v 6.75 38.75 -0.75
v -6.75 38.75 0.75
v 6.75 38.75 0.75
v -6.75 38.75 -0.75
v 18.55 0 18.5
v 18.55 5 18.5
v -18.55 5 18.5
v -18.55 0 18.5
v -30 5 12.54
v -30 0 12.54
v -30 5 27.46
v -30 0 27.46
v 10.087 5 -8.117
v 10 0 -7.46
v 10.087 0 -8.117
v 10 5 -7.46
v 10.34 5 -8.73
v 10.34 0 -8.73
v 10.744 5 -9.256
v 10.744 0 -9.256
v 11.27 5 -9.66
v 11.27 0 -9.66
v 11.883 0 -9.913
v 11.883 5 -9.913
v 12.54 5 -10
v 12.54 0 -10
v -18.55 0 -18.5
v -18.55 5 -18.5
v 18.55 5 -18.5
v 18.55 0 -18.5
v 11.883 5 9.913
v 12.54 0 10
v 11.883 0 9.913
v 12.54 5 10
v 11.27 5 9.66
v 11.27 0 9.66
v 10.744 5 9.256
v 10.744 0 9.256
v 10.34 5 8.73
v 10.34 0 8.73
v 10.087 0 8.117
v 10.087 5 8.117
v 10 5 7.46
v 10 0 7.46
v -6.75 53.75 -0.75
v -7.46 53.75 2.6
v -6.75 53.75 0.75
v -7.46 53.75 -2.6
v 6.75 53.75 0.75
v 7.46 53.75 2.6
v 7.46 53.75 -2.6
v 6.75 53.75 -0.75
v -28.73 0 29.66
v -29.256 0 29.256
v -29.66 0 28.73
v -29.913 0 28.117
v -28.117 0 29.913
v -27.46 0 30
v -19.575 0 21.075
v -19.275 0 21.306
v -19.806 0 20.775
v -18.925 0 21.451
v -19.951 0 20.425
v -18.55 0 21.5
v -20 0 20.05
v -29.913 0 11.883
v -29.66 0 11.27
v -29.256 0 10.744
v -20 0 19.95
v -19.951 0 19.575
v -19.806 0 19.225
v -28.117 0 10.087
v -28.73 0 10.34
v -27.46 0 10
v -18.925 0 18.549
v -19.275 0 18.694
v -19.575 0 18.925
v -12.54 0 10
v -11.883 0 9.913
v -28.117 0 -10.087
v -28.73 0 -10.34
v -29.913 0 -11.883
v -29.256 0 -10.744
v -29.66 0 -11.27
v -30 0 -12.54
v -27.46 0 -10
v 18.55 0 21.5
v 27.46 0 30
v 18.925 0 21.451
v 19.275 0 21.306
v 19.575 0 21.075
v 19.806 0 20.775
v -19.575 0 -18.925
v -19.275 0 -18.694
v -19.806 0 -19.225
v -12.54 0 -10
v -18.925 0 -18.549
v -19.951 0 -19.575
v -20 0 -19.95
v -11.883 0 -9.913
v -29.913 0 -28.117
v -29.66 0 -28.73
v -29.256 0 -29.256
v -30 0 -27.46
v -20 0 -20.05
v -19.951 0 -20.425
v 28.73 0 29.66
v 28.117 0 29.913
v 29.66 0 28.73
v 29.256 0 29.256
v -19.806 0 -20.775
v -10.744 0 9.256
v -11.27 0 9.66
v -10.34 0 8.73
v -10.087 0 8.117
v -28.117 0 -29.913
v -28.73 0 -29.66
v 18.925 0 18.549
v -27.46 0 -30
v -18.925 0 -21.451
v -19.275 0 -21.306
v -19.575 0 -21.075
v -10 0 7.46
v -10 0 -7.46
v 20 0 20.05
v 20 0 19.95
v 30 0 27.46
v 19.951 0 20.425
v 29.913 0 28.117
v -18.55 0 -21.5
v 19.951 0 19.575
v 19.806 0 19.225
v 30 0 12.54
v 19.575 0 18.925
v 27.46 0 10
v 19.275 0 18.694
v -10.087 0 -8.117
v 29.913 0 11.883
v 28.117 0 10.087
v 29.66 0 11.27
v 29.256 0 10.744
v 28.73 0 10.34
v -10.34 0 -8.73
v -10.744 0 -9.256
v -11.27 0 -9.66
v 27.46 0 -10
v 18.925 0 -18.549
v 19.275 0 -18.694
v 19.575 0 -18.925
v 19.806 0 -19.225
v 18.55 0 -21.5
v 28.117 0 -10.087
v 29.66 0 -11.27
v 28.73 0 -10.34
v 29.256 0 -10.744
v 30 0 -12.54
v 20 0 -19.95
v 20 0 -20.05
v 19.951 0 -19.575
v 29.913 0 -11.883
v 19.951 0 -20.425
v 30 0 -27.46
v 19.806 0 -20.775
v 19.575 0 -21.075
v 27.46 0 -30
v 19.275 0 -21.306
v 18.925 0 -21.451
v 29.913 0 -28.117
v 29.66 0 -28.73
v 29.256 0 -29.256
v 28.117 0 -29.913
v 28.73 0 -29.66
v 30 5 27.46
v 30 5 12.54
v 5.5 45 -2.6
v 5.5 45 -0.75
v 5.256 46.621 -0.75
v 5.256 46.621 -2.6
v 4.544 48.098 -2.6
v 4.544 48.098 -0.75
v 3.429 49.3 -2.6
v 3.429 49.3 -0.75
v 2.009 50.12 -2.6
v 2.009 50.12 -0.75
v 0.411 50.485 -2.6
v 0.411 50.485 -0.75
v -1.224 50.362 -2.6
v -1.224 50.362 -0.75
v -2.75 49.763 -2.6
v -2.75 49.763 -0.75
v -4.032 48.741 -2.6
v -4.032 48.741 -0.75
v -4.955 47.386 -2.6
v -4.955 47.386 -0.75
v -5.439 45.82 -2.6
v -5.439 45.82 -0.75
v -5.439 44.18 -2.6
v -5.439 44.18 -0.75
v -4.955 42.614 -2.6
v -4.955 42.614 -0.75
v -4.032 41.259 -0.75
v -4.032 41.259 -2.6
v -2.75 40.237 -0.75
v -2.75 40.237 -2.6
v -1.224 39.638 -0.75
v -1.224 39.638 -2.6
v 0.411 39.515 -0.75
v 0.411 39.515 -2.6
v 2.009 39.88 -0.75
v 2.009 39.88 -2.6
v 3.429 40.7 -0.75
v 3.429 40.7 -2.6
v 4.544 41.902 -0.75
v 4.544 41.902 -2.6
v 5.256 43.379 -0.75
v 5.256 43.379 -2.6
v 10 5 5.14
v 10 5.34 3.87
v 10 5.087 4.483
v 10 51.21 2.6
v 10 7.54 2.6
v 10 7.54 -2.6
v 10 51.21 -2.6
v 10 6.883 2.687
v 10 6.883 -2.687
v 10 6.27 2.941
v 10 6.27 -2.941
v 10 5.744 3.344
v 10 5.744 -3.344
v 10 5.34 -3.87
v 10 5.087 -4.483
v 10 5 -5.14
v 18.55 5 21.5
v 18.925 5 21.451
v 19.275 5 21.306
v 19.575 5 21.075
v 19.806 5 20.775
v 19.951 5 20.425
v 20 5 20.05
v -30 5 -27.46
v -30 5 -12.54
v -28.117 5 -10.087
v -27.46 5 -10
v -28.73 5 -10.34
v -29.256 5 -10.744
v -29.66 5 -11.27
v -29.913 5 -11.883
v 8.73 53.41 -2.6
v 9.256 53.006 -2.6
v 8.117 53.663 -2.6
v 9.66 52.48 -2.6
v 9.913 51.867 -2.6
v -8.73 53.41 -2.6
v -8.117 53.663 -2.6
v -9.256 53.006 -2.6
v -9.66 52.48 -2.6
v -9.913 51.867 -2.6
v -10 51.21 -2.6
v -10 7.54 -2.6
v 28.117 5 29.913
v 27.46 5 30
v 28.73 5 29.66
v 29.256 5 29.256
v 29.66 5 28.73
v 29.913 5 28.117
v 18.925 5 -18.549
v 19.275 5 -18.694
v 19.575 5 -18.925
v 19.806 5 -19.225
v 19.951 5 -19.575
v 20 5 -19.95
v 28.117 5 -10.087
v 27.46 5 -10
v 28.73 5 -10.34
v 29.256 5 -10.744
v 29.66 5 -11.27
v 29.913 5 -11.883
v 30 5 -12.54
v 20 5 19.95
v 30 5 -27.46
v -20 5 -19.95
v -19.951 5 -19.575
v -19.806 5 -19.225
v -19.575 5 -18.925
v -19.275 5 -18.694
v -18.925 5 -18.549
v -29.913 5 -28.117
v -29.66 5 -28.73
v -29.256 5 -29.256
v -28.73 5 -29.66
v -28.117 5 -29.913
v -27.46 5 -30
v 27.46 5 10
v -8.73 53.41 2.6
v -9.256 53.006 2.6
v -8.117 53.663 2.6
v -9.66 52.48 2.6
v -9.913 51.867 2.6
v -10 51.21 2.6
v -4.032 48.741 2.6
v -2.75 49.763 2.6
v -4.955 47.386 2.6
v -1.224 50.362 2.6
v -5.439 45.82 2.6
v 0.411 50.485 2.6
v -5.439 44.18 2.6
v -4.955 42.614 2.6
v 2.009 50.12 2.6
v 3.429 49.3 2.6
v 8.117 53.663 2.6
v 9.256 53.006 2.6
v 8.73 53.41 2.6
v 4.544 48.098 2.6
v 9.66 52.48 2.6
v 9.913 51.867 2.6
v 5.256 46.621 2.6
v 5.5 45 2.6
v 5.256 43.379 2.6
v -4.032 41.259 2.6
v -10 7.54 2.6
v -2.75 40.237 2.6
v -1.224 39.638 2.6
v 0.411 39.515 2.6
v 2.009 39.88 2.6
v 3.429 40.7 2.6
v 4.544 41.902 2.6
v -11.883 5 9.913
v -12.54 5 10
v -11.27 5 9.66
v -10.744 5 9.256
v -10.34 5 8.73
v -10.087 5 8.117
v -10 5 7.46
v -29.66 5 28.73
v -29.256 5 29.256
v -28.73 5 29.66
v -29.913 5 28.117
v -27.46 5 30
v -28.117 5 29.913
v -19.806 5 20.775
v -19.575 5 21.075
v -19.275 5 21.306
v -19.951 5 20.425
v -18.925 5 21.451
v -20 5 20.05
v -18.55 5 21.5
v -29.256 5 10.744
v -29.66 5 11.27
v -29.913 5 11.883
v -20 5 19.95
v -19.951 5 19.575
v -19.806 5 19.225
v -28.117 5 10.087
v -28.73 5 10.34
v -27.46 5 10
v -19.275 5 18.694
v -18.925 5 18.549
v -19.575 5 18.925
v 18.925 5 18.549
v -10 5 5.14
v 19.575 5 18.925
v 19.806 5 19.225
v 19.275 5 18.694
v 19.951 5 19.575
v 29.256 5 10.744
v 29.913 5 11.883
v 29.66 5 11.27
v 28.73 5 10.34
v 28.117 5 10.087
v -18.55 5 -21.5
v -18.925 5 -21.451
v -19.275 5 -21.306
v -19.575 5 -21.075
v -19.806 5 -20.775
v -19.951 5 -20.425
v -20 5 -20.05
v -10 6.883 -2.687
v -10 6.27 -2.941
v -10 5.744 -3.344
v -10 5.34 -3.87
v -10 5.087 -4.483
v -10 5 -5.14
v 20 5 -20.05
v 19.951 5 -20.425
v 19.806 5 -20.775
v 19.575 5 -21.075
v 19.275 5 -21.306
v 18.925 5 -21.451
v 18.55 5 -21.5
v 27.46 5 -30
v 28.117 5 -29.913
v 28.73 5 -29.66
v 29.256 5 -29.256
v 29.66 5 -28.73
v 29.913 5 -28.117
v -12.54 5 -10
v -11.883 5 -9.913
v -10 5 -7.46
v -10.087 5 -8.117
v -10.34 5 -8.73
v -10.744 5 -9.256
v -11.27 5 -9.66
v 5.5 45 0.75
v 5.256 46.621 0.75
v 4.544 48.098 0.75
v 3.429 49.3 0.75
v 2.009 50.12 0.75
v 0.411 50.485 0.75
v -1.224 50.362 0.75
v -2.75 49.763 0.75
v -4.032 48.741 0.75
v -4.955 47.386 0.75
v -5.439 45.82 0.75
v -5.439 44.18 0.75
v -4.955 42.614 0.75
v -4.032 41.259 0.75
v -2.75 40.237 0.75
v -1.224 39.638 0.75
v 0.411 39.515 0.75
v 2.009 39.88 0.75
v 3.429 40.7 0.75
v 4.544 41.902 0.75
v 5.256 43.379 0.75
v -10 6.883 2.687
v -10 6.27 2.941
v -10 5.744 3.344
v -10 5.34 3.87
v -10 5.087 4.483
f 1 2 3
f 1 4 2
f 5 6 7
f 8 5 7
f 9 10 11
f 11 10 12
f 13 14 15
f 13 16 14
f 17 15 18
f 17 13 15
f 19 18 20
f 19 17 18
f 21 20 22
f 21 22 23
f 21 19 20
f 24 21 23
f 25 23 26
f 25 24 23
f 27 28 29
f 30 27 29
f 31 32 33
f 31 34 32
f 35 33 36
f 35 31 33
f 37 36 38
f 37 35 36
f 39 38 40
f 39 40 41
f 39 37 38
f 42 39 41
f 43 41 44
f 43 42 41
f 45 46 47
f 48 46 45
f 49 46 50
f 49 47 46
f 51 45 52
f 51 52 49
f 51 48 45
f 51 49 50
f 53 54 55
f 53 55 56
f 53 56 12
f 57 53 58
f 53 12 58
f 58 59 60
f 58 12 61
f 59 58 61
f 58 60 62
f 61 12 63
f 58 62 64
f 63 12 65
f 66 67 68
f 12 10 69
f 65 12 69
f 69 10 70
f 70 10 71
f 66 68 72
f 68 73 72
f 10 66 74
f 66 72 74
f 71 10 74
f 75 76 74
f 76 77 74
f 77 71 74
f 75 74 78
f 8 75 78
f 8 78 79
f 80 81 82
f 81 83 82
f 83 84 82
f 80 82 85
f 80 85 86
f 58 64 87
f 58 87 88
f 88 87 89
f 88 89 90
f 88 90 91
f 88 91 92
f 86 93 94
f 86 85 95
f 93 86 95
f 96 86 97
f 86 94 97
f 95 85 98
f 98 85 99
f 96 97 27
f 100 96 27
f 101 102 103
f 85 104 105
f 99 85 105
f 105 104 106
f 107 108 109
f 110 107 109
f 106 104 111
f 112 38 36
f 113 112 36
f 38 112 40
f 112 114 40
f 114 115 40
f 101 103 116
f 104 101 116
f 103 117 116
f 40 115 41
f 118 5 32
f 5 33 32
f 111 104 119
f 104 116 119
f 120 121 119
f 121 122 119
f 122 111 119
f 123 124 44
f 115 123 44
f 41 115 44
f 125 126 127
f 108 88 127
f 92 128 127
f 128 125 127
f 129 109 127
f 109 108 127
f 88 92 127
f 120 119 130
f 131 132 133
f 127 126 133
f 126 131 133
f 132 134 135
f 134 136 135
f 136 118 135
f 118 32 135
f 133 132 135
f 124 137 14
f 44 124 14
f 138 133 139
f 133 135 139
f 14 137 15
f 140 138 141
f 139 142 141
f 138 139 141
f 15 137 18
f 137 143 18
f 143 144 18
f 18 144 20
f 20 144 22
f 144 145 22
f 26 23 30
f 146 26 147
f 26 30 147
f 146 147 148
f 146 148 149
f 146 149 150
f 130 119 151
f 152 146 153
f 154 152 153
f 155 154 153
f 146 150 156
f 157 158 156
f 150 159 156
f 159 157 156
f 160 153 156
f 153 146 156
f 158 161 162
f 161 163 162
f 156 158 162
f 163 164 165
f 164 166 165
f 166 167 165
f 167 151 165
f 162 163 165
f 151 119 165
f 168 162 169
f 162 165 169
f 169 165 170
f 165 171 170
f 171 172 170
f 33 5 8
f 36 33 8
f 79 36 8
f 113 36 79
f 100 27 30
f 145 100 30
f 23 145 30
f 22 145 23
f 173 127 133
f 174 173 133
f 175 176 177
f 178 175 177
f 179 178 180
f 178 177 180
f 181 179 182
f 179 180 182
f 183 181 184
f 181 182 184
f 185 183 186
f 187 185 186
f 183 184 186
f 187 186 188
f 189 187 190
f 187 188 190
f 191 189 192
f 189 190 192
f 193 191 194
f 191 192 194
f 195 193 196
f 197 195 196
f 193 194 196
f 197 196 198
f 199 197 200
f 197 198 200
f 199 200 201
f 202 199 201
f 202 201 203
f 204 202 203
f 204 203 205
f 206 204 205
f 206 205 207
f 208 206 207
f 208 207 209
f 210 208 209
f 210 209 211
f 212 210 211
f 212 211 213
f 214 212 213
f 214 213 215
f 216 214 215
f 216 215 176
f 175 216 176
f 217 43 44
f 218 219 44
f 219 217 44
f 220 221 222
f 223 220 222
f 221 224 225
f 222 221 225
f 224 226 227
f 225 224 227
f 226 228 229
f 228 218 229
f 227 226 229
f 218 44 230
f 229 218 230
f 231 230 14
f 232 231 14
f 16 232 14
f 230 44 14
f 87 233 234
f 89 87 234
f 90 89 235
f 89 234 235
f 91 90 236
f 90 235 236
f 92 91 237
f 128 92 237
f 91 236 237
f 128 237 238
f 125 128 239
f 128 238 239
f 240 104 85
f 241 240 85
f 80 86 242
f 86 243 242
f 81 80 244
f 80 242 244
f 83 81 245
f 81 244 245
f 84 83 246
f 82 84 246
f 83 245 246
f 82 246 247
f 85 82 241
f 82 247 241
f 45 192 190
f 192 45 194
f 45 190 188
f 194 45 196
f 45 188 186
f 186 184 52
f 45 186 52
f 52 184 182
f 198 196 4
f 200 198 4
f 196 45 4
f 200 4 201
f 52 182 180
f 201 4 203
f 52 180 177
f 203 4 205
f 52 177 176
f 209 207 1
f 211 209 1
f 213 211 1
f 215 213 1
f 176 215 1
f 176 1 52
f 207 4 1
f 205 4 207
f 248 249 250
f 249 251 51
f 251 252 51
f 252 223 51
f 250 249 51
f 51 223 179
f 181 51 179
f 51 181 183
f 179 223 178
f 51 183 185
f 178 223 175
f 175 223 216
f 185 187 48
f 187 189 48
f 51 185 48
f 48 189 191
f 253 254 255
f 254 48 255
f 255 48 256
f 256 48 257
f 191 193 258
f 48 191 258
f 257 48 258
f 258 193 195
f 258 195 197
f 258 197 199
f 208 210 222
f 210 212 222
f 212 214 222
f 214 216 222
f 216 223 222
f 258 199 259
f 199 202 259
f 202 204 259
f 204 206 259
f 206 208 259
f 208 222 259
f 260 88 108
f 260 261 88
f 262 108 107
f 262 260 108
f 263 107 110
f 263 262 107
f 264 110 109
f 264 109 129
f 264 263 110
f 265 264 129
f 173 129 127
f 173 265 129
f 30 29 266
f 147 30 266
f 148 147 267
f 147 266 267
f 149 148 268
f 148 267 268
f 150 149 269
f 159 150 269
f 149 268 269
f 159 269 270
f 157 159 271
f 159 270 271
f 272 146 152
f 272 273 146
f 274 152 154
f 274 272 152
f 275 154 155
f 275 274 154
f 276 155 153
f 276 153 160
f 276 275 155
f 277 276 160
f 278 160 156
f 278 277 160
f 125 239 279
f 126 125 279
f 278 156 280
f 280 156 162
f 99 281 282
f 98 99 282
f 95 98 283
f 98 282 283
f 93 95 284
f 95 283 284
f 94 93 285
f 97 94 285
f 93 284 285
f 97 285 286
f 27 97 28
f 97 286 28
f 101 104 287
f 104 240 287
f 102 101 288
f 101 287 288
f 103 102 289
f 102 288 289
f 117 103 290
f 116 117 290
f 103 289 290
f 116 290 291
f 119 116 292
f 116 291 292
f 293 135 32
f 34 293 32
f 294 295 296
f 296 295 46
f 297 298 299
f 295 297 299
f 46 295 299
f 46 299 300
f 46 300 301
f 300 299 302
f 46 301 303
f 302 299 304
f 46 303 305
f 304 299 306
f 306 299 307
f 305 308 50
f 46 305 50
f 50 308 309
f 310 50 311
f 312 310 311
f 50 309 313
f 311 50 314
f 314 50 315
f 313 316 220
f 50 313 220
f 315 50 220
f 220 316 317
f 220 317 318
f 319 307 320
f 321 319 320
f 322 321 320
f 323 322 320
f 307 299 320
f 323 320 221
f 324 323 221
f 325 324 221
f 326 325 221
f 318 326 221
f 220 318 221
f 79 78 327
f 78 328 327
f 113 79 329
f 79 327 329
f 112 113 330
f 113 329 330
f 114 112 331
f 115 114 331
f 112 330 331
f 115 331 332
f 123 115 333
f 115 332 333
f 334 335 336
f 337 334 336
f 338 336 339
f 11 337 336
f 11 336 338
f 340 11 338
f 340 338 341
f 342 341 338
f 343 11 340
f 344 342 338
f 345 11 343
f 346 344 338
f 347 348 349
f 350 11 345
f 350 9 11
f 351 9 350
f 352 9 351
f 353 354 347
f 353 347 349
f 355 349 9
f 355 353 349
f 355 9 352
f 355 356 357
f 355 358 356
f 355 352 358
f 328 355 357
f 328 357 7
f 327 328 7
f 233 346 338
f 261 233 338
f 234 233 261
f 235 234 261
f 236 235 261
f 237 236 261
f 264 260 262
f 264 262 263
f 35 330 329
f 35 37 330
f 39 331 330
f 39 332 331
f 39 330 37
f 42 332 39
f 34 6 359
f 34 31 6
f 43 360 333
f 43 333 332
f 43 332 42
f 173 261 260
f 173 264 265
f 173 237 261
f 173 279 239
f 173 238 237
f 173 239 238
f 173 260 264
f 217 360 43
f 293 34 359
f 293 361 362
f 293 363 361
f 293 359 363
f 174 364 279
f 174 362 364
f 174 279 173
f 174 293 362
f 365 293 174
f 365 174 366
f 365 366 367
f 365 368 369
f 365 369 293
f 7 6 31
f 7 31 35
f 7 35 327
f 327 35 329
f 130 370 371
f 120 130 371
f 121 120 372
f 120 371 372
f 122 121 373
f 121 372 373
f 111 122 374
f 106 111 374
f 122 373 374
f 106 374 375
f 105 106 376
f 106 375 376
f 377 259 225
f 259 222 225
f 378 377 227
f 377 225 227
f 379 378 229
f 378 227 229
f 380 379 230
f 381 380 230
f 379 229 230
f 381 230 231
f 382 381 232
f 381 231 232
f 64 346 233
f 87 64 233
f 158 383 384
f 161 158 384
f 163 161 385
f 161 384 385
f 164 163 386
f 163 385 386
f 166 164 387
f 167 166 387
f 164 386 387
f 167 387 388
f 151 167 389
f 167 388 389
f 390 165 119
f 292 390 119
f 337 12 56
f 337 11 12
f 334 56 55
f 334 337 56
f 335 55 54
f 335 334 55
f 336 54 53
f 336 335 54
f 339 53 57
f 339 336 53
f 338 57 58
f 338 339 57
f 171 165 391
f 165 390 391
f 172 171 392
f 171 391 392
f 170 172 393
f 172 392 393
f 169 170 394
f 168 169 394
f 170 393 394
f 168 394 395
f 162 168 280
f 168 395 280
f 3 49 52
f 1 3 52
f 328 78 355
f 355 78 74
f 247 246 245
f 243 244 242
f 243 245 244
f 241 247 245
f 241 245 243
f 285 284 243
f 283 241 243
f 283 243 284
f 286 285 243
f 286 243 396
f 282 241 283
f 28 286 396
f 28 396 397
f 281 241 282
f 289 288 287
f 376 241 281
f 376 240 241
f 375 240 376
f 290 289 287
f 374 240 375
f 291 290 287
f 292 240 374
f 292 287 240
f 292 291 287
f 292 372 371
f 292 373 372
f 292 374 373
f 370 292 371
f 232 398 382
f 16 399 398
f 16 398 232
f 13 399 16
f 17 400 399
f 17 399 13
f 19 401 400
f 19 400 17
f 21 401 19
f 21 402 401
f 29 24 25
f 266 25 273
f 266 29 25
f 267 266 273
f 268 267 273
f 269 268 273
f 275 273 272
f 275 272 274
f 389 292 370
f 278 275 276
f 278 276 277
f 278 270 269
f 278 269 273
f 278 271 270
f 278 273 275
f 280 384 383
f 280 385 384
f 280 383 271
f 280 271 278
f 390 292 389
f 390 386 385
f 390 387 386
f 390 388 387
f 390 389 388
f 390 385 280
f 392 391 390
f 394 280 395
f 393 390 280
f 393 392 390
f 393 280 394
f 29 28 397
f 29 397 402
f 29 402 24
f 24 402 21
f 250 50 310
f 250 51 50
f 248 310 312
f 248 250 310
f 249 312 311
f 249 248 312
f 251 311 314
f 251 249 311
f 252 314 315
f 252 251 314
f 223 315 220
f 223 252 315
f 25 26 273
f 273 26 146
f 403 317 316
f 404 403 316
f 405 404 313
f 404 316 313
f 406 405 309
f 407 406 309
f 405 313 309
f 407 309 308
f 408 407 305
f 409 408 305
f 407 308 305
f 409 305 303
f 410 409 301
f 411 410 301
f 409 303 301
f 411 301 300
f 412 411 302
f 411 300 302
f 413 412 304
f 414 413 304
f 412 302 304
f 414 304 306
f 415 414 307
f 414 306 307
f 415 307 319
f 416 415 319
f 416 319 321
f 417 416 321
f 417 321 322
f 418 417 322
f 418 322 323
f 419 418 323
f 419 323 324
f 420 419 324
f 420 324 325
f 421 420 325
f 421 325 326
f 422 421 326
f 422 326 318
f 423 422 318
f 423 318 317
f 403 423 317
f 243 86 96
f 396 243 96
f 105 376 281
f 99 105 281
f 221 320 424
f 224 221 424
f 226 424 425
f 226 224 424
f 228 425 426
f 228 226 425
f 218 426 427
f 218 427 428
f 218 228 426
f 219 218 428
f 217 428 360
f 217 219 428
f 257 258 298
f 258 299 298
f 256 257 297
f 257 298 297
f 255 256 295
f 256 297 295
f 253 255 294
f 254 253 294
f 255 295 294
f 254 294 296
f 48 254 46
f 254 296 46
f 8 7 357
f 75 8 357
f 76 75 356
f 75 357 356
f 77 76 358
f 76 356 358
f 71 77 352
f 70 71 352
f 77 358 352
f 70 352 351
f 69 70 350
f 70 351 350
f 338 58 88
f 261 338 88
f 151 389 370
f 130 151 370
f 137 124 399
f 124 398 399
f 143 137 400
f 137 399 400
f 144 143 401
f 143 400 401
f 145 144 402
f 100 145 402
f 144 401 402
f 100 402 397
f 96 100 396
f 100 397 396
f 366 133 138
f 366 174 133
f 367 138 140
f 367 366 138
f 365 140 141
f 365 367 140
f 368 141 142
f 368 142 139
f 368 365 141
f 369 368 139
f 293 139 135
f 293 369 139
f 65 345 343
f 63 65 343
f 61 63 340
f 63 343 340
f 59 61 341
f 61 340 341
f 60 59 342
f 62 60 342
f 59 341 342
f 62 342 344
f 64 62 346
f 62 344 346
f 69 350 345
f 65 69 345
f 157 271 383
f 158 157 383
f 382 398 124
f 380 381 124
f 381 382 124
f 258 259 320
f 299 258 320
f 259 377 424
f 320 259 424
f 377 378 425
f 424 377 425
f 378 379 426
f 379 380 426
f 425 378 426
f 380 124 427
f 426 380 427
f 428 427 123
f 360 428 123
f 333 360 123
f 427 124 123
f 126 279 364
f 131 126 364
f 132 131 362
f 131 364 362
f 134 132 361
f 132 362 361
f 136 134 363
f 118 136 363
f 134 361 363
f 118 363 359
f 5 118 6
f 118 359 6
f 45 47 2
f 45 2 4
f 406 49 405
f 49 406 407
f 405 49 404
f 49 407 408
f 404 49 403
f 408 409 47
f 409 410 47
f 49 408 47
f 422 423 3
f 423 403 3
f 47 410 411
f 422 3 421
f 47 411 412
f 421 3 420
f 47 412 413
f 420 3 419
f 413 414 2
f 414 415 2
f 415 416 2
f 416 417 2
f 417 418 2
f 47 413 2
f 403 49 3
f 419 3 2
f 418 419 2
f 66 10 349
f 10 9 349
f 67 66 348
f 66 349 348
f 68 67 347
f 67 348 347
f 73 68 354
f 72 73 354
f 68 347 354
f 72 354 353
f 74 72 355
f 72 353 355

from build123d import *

# Parameters (mm, degrees)
BOSS_EXTRUDE1_DEPTH = 5
CUT_EXTRUDE1_DEPTH  = 43.720018727
FILLET1_R           = 2.54
SKETCH9_W           = 20
SKETCH9_H           = 5.200996356
BOSS_EXTRUDE5_DEPTH = 33.75
SKETCH11_W          = 3.25
SKETCH11_H          = 1.5
BOSS_EXTRUDE6_DEPTH = 15
SKETCH12_R          = 5.5
CUT_EXTRUDE3_DEPTH  = 70.655258104
FILLET3_R           = 2.54


with BuildPart() as part:
    # Sketch1 → Boss-Extrude1 (new body)
    with BuildSketch(Plane(origin=(0, 0, 0), x_dir=(1, 0, 0), z_dir=(0, 1, 0))):
        Polygon((-30, -10), (-30, -30), (30, -30), (30, -10), (10, -10), (10, 10), (30, 10), (30, 30), (-30, 30), (-30, 10), (-10, 10), (-10, -10), align=None)
    extrude(amount=BOSS_EXTRUDE1_DEPTH)

    # Sketch2 → Cut-Extrude1 (cut, through all)
    with BuildSketch(Plane(origin=(0, 5, 0), x_dir=(1, 0, 0), z_dir=(0, 1, 0))):
        with BuildLine():
            Line((-18.55, 18.5), (18.55, 18.5))
            ThreePointArc((18.55, 18.5), (19.575304833, 18.924695167), (20, 19.95))
            Line((20, 19.95), (20, 20.05))
            ThreePointArc((20, 20.05), (19.575304833, 21.075304833), (18.55, 21.5))
            Line((18.55, 21.5), (-18.55, 21.5))
            ThreePointArc((-18.55, 21.5), (-19.575304833, 21.075304833), (-20, 20.05))
            Line((-20, 20.05), (-20, 19.95))
            ThreePointArc((-20, 19.95), (-19.575304833, 18.924695167), (-18.55, 18.5))
        make_face()
        with BuildLine():
            Line((-18.55, -21.5), (18.55, -21.5))
            ThreePointArc((18.55, -21.5), (19.575304833, -21.075304833), (20, -20.05))
            Line((20, -20.05), (20, -19.95))
            ThreePointArc((20, -19.95), (19.575304833, -18.924695167), (18.55, -18.5))
            Line((18.55, -18.5), (-18.55, -18.5))
            ThreePointArc((-18.55, -18.5), (-19.575304833, -18.924695167), (-20, -19.95))
            Line((-20, -19.95), (-20, -20.05))
            ThreePointArc((-20, -20.05), (-19.575304833, -21.075304833), (-18.55, -21.5))
        make_face()
    extrude(amount=-CUT_EXTRUDE1_DEPTH, mode=Mode.SUBTRACT)

    # Fillet1
    fillet1_edges = [part.edges().sort_by_distance(p)[0] for p in [
        (-10, 2.5, -10),
        (-30, 2.5, -10),
        (-30, 2.5, -30),
        (30, 2.5, -30),
        (30, 2.5, -10),
        (10, 2.5, -10),
        (10, 2.5, 10),
        (30, 2.5, 10),
        (30, 2.5, 30),
        (-30, 2.5, 30),
        (-30, 2.5, 10),
        (-10, 2.5, 10),
    ]]
    fillet(fillet1_edges, radius=FILLET1_R)

    # Sketch9 → Boss-Extrude5 (add)
    with BuildSketch(Plane(origin=(0, 5, 0), x_dir=(1, 0, 0), z_dir=(0, 1, 0))):
        Rectangle(SKETCH9_W, SKETCH9_H)
    extrude(amount=BOSS_EXTRUDE5_DEPTH)

    # Sketch11 → Boss-Extrude6 (add)
    with BuildSketch(Plane(origin=(0, 38.75, 0), x_dir=(1, 0, 0), z_dir=(0, 1, 0))):
        Polygon((-10, 2.600498178), (-10, 0.75), (-6.75, 0.75), (6.75, 0.75), (10, 0.75), (10, 2.600498178), align=None)
        with Locations((-8.375, 0)):
            Rectangle(SKETCH11_W, SKETCH11_H)
        Polygon((-6.75, -0.75), (-10, -0.75), (-10, -2.600498178), (10, -2.600498178), (10, -0.75), (6.75, -0.75), align=None)
        with Locations((8.375, 0)):
            Rectangle(SKETCH11_W, SKETCH11_H)
    extrude(amount=BOSS_EXTRUDE6_DEPTH)

    # Sketch12 → Cut-Extrude3 (cut, through all)
    with BuildSketch(Plane.XY.offset(2.600498178)):
        with Locations((0, 45)):
            Circle(SKETCH12_R)
    extrude(amount=-CUT_EXTRUDE3_DEPTH, mode=Mode.SUBTRACT)

    # Fillet3
    fillet3_edges = [part.edges().sort_by_distance(p)[0] for p in [
        (0, 5, -2.600498178),
        (0, 5, 2.600498178),
        (10, 53.75, 0),
        (-10, 53.75, 0),
    ]]
    fillet(fillet3_edges, radius=FILLET3_R)


solid = part.part
